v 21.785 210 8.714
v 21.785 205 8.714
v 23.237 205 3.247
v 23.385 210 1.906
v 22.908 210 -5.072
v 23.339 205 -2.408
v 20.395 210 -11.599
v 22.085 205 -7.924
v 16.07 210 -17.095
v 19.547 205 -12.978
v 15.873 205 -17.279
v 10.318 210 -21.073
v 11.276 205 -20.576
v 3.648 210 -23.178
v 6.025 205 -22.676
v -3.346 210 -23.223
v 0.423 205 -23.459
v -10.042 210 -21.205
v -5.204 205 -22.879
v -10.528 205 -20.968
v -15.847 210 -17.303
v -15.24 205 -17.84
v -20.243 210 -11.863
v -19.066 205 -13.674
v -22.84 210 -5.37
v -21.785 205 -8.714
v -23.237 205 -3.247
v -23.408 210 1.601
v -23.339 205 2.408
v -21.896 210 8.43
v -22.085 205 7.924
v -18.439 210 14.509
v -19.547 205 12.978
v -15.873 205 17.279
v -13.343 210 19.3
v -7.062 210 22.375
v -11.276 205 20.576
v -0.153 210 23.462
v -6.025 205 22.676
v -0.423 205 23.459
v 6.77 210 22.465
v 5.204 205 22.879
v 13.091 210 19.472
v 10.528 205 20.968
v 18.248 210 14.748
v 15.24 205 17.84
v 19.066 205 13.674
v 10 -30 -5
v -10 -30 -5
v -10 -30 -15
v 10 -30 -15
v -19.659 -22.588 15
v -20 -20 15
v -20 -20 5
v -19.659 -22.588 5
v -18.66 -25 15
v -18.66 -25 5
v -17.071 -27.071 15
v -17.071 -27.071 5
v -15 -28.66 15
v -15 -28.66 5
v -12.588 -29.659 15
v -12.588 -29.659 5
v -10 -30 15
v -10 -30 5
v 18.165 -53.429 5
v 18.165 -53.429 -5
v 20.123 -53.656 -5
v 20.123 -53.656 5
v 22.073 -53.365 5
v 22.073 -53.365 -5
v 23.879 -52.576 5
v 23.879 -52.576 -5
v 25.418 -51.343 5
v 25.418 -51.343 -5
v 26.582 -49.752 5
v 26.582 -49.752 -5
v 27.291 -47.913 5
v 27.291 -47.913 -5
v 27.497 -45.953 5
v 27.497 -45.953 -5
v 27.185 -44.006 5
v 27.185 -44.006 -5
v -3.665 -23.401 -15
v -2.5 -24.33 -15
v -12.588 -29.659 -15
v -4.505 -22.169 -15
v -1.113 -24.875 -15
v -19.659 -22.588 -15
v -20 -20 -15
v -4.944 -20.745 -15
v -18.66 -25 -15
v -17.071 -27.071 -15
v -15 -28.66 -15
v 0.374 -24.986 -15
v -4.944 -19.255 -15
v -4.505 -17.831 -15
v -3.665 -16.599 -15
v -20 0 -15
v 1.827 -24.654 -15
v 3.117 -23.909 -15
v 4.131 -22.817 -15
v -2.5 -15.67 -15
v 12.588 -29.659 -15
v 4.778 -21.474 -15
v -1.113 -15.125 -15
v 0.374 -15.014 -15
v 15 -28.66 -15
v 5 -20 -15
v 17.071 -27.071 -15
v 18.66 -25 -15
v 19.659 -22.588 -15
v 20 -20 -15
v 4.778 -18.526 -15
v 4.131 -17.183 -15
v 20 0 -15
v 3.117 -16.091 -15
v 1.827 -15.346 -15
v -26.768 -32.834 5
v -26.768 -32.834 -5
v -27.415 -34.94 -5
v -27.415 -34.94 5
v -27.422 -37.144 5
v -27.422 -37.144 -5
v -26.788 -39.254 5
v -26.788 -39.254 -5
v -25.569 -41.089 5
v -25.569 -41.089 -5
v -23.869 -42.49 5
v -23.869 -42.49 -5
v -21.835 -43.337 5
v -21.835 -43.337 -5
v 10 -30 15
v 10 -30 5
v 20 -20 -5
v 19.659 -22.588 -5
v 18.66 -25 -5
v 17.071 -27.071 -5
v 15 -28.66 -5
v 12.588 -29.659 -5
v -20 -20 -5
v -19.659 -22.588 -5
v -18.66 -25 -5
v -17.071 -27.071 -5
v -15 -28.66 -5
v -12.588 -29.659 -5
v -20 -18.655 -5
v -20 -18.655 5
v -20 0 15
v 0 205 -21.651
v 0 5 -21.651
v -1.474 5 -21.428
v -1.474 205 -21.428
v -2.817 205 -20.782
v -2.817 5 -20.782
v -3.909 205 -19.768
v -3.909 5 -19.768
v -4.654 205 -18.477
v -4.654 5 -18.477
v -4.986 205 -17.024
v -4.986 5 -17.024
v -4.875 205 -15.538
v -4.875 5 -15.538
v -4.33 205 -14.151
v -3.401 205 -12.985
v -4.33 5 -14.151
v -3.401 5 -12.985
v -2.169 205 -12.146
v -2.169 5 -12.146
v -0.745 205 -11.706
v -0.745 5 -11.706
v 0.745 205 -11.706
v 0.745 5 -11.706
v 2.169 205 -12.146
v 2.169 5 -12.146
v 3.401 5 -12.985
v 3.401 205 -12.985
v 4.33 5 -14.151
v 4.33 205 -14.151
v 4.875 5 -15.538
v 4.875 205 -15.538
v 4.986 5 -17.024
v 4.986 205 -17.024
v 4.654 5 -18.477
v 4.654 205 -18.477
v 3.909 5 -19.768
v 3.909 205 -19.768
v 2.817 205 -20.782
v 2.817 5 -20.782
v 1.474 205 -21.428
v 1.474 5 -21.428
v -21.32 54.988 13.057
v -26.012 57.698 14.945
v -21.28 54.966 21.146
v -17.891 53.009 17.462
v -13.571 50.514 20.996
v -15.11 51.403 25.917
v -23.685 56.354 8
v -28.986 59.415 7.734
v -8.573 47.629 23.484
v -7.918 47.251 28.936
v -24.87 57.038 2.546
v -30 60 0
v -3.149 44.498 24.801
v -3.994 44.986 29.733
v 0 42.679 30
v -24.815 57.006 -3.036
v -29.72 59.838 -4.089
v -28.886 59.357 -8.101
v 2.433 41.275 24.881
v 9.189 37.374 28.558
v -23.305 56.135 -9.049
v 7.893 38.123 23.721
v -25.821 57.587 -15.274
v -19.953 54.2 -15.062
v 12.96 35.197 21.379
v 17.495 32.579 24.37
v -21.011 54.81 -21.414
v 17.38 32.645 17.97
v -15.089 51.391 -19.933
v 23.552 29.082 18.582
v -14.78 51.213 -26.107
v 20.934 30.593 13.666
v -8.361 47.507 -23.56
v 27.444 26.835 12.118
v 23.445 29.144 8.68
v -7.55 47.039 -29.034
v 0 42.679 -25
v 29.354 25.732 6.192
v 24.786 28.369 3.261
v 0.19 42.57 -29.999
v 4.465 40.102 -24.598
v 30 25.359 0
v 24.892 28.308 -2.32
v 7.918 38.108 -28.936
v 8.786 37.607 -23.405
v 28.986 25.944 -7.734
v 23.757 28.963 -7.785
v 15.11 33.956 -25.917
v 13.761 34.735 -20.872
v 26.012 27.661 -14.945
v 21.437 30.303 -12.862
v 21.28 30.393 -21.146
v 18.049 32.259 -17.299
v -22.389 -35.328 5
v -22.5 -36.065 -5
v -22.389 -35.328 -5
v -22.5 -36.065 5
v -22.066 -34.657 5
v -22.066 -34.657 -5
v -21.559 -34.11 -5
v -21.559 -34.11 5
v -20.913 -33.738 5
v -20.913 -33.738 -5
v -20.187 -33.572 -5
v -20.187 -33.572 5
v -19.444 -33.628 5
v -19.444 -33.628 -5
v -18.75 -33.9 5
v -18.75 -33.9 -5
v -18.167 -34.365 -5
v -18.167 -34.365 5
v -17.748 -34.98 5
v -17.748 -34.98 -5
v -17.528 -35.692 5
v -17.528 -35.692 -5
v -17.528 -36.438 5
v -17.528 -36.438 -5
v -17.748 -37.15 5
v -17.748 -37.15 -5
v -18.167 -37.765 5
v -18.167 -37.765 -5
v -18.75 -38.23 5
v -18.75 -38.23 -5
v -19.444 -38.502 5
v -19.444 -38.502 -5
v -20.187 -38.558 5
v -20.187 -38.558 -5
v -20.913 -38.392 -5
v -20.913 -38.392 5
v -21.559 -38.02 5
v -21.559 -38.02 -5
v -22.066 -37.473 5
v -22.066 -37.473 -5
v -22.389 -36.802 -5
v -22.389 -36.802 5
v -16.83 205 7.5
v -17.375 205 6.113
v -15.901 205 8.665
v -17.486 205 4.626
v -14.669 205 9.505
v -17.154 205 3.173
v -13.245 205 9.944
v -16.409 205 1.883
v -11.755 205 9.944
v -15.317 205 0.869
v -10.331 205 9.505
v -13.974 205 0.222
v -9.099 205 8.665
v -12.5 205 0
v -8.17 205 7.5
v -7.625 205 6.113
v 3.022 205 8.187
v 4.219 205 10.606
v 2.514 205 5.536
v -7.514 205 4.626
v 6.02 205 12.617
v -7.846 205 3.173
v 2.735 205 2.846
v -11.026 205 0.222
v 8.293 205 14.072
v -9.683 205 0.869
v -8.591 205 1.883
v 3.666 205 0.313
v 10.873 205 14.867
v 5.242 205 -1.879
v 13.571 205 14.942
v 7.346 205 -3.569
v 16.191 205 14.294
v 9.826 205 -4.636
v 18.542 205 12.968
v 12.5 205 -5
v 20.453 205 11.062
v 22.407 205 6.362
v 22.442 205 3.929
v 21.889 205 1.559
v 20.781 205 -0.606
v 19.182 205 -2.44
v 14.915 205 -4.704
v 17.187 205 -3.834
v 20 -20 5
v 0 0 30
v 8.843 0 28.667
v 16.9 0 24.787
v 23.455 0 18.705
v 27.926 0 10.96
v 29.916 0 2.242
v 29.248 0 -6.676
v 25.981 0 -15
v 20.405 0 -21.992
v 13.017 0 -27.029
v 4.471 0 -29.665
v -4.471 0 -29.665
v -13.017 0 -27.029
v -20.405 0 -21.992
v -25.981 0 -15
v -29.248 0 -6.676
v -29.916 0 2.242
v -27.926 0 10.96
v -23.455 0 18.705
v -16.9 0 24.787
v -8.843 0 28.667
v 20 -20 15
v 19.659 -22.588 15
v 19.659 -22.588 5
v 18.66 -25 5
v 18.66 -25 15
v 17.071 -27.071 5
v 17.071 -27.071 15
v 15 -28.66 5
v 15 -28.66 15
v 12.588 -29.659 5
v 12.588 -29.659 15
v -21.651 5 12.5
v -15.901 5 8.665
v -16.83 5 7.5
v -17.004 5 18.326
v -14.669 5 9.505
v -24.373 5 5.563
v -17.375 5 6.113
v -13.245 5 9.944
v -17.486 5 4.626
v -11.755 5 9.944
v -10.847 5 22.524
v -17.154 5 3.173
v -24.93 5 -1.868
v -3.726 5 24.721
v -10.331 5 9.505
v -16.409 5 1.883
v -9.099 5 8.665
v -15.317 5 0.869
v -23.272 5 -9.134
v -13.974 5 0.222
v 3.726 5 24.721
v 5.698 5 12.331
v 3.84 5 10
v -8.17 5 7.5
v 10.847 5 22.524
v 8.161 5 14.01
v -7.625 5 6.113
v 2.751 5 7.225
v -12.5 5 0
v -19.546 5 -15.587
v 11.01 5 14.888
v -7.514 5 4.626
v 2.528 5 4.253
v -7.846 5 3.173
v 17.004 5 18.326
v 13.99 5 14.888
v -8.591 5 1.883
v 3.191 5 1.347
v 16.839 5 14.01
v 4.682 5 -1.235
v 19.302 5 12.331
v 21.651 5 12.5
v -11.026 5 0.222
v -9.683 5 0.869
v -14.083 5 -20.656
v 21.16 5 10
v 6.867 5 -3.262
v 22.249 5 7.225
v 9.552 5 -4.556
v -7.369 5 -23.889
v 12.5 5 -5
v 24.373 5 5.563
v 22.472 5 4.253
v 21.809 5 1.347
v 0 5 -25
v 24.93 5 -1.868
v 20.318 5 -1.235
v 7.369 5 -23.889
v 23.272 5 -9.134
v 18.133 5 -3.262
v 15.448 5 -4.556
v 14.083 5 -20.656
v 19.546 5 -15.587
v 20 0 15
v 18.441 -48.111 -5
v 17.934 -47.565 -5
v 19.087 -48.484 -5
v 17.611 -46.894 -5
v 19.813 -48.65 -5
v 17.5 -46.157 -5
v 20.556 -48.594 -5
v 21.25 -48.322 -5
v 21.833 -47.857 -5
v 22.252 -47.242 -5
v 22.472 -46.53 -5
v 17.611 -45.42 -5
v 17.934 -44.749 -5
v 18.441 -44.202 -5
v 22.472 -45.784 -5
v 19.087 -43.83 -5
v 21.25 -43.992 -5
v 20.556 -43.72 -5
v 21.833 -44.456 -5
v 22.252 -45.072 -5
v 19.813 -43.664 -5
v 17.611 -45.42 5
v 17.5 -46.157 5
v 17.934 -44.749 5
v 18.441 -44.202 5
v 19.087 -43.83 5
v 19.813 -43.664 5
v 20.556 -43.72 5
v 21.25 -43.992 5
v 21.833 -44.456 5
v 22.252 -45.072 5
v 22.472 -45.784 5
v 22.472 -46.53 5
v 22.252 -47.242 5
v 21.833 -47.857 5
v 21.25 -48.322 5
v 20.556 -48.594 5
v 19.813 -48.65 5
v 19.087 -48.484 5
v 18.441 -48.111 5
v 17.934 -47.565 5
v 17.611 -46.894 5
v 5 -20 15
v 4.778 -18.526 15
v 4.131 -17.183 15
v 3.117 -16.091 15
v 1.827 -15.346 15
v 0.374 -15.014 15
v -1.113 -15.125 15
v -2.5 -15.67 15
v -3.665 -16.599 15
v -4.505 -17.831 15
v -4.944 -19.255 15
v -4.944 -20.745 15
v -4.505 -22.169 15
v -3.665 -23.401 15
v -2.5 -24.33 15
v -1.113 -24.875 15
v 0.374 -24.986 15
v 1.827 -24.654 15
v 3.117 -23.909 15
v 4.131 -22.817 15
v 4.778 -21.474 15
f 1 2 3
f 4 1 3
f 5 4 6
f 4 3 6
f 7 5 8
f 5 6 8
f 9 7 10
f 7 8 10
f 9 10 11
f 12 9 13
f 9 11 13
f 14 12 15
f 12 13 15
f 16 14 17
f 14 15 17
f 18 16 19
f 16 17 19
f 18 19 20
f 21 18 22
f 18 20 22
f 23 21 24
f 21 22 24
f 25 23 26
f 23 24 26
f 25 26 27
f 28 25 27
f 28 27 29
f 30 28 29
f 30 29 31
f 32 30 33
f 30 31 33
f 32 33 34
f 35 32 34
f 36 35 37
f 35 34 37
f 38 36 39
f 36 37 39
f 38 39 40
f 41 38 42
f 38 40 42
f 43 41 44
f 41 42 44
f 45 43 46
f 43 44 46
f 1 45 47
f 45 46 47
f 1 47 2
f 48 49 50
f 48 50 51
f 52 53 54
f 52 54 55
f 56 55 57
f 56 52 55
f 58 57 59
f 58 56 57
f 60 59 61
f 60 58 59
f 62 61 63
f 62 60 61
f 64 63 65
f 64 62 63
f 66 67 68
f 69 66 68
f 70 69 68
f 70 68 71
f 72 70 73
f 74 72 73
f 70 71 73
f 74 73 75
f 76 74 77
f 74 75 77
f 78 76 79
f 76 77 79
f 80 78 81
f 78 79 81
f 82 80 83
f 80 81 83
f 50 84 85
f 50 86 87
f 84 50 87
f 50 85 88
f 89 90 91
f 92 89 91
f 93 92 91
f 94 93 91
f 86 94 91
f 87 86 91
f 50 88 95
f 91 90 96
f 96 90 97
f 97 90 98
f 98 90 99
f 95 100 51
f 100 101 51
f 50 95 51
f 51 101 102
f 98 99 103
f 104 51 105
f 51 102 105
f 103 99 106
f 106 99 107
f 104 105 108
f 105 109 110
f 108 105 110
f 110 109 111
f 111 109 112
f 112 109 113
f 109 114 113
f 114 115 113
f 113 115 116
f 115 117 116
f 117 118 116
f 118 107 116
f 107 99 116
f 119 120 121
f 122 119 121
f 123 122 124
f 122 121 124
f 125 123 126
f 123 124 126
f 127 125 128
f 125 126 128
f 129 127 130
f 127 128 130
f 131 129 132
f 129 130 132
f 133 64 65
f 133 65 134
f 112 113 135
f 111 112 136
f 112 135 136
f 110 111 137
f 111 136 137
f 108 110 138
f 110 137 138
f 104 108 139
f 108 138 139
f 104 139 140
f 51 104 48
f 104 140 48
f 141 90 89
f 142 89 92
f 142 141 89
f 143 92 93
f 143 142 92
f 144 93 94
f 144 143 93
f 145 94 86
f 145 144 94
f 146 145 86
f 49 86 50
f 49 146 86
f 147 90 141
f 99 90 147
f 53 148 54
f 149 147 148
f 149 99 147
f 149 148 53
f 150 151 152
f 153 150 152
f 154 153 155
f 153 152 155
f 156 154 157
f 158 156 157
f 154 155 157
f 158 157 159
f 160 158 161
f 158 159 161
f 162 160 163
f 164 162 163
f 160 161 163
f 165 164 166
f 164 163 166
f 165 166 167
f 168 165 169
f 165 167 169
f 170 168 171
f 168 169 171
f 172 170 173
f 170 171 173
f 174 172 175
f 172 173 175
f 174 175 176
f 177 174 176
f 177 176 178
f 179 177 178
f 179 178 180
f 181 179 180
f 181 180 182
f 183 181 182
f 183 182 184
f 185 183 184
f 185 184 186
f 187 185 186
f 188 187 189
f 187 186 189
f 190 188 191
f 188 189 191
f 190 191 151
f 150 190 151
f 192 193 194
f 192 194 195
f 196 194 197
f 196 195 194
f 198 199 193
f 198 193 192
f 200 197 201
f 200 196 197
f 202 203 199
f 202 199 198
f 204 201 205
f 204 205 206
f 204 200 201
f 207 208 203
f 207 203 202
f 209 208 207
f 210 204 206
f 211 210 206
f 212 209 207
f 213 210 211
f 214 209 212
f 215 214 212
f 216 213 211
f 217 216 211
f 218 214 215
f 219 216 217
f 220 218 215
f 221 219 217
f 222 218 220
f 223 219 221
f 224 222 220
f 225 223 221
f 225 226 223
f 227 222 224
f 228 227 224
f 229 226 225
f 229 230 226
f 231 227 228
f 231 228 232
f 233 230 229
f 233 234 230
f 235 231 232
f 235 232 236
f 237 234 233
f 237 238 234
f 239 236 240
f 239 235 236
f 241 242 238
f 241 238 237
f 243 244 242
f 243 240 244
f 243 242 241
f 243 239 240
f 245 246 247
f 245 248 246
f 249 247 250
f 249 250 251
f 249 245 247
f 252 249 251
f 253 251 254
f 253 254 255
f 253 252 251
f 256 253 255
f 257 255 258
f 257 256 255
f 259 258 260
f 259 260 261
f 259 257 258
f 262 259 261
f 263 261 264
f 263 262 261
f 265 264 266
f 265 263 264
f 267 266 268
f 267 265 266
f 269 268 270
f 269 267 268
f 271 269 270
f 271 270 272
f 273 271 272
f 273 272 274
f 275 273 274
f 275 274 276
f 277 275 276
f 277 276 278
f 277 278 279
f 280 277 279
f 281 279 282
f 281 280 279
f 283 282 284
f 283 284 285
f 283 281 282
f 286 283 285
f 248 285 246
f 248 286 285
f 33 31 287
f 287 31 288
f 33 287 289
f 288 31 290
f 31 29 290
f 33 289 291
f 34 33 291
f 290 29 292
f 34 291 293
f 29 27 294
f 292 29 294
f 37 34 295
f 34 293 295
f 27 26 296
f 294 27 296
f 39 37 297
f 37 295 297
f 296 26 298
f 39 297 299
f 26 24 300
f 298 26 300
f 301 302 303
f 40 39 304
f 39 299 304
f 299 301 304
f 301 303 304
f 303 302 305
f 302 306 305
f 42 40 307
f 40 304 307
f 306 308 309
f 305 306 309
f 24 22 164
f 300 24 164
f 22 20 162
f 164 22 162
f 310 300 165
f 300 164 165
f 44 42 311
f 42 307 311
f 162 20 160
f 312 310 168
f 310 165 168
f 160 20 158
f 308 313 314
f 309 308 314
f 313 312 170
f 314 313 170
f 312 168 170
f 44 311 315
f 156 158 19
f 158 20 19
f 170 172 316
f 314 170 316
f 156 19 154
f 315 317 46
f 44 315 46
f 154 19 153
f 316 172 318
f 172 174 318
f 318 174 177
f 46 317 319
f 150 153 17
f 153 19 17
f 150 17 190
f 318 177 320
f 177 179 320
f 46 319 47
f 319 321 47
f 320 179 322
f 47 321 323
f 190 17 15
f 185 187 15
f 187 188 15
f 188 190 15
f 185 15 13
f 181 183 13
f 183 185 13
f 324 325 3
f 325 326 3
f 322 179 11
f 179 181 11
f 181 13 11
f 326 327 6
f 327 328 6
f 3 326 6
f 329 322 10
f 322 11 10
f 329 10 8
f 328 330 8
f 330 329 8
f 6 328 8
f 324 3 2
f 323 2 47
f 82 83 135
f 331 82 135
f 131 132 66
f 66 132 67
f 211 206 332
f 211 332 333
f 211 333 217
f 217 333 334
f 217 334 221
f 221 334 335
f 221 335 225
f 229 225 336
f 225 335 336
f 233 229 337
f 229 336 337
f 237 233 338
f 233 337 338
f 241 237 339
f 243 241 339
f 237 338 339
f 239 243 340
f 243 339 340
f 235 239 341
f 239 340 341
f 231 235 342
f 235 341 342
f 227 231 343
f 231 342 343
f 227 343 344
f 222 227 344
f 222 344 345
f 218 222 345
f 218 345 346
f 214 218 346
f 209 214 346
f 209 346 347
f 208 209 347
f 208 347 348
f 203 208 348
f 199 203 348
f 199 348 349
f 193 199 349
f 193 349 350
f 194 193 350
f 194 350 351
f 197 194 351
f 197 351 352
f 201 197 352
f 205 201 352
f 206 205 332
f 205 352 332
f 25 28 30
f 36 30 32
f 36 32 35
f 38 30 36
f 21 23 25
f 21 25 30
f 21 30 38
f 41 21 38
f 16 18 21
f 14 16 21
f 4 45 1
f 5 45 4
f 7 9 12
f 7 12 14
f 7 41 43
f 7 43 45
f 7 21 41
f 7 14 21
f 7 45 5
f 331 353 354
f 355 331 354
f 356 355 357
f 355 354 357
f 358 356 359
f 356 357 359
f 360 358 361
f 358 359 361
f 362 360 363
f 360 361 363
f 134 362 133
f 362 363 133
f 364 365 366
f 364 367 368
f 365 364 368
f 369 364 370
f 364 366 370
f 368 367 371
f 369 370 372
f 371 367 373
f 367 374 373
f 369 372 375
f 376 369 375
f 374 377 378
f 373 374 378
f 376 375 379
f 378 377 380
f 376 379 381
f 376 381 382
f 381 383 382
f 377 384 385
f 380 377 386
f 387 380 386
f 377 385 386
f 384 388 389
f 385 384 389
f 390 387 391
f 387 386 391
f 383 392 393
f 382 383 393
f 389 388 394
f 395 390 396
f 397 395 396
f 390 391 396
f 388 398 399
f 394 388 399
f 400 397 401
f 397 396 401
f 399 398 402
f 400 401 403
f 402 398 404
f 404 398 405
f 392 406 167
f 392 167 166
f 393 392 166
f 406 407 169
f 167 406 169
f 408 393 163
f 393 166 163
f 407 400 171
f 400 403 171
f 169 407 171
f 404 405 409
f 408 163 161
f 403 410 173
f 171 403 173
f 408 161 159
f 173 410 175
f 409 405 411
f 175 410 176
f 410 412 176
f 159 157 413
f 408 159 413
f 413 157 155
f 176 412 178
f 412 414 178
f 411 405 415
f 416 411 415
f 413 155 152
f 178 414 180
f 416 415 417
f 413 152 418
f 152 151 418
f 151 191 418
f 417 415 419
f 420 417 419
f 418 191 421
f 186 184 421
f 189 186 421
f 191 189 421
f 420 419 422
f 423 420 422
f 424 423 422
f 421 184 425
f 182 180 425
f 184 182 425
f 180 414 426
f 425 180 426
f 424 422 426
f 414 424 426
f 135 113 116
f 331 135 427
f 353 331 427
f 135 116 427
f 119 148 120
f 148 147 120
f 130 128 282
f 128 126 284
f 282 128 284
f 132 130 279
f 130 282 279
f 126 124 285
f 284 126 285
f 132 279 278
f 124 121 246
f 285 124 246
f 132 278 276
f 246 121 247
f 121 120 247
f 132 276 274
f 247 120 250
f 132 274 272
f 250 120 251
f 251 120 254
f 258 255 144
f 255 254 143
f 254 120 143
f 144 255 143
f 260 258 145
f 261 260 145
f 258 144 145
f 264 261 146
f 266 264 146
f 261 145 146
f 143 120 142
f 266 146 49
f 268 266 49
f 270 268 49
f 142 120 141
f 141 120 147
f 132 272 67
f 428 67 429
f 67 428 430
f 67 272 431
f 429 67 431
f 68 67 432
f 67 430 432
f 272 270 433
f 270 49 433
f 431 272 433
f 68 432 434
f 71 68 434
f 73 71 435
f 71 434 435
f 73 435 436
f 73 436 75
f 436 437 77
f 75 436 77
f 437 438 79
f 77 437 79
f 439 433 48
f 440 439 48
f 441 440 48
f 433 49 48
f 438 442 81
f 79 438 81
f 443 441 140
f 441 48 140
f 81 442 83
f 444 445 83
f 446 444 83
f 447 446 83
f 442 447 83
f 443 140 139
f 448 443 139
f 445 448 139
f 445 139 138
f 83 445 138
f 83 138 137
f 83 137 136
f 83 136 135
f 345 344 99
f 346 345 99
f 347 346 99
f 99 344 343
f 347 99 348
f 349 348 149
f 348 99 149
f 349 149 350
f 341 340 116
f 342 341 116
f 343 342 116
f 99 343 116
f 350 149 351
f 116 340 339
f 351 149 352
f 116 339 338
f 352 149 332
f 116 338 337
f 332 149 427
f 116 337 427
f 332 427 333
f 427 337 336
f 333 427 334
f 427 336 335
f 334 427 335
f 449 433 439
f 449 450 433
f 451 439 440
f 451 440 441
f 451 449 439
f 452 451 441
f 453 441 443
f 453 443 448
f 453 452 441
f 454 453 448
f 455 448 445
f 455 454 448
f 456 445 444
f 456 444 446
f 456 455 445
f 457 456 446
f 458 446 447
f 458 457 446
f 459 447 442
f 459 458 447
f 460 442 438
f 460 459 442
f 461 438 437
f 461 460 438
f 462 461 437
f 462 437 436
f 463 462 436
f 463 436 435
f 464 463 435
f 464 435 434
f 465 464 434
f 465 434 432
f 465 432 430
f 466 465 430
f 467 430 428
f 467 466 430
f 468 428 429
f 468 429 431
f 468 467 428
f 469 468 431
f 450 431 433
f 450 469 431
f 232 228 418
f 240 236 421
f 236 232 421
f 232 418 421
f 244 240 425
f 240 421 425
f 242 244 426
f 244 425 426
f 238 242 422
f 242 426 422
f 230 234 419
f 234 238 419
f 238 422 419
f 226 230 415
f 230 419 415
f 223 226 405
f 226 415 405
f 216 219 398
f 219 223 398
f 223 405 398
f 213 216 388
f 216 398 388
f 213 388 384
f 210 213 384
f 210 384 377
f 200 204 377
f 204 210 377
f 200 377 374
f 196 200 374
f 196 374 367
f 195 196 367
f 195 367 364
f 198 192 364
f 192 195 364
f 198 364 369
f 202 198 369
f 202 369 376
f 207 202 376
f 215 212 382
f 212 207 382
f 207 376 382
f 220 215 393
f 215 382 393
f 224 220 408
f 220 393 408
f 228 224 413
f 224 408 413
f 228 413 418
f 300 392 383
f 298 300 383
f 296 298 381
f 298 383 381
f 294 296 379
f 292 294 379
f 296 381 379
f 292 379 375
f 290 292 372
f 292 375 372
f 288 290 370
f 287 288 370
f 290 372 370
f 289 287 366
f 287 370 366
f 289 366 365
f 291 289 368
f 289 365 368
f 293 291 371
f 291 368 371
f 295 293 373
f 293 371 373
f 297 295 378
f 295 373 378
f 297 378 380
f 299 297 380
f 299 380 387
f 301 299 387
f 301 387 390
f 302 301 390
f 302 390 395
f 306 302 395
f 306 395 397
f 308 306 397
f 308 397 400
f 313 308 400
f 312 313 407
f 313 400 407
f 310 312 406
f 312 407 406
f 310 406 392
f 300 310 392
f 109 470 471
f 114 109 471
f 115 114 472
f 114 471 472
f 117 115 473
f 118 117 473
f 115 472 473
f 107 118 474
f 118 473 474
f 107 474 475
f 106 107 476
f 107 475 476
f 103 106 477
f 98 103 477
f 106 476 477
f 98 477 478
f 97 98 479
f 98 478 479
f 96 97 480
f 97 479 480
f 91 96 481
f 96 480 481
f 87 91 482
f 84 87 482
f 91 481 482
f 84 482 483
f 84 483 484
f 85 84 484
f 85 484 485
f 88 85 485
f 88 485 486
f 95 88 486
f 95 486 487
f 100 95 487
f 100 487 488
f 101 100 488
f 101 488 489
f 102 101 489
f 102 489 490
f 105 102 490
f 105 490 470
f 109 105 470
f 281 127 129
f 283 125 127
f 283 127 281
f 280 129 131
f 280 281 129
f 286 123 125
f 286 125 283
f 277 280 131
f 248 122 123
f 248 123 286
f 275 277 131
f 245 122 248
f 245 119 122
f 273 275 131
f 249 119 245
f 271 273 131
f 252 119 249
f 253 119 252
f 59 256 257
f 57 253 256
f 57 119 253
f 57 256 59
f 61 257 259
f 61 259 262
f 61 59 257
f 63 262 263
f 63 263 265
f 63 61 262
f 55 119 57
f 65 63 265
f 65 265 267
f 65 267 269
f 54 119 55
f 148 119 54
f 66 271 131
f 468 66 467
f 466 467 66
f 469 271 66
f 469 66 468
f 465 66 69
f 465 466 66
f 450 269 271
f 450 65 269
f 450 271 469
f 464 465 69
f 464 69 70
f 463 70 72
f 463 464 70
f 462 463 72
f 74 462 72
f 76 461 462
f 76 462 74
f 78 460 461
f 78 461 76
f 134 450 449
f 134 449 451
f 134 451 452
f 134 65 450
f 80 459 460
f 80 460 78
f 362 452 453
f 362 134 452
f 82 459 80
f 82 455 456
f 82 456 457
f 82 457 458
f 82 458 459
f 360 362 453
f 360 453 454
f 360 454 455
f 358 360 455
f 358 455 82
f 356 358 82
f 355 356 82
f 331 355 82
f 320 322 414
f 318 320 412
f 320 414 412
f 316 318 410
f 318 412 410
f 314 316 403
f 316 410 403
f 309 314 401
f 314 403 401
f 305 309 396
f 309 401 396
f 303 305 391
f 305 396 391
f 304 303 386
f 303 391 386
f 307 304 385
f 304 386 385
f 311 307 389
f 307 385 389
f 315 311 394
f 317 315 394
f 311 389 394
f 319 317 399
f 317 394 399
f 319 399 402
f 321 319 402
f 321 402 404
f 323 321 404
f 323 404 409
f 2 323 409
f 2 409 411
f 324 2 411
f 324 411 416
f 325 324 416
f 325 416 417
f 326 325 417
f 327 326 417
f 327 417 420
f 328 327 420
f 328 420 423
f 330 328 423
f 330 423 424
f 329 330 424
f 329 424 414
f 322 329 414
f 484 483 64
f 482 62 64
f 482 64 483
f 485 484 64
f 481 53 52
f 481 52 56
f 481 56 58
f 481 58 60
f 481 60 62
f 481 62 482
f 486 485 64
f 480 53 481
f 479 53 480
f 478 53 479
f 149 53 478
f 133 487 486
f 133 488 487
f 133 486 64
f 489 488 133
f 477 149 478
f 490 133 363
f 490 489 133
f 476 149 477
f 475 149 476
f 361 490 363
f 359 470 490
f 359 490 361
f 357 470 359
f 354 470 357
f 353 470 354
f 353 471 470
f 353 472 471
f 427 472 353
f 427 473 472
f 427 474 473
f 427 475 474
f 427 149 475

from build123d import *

# Parameters (mm, degrees)
CROQUIS2_R                 = 30
SALIENTE_EXTRUIR1_DEPTH    = 60
CROQUIS3_W                 = 40
CROQUIS3_H                 = 30
SALIENTE_EXTRUIR2_DEPTH    = 30
REDONDEO1_R                = 10
CROQUIS4_R                 = 5
CORTAR_EXTRUIR1_DEPTH      = 81.777472107
CORTAR_EXTRUIR2_DEPTH      = 74.484692283
CORTAR_EXTRUIR2_DEPTH_BACK = 74.484692283
CROQUIS7_R                 = 25
CORTAR_EXTRUIR3_DEPTH      = 70.462219947
CROQUIS8_R                 = 5
CROQUIS8_R_2               = 10
SALIENTE_EXTRUIR3_DEPTH    = 200
CROQUIS10_R                = 23.462912018
SALIENTE_EXTRUIR4_DEPTH    = 5
CROQUIS11_R                = 2.5
SALIENTE_EXTRUIR5_DEPTH    = 5


with BuildPart() as part:
    # Croquis2 → Saliente-Extruir1 (new body)
    with BuildSketch(Plane(origin=(0, 0, 0), x_dir=(1, 0, 0), z_dir=(0, 1, 0))):
        with Locations(Location((0, 0, 0), (0, 0, 270))):
            Circle(CROQUIS2_R)
    extrude(amount=SALIENTE_EXTRUIR1_DEPTH)

    # Croquis3 → Saliente-Extruir2 (add)
    with BuildSketch(Plane.XZ):
        Rectangle(CROQUIS3_W, CROQUIS3_H)
    extrude(amount=SALIENTE_EXTRUIR2_DEPTH)

    # Redondeo1
    redondeo1_edges = [part.edges().sort_by_distance(p)[0] for p in [
        (-20, -30, 0),
        (20, -30, 0),
    ]]
    fillet(redondeo1_edges, radius=REDONDEO1_R)

    # Croquis4 → Cortar-Extruir1 (cut, through all)
    with BuildSketch(Plane.XY.offset(15)):
        with Locations((0, -20)):
            Circle(CROQUIS4_R)
    extrude(amount=-CORTAR_EXTRUIR1_DEPTH, mode=Mode.SUBTRACT)

    # Croquis5 → Cortar-Extruir2 (cut, two sides: drawn at the far end of the back side and taken through both)
    with BuildSketch(Plane.XY.offset(-CORTAR_EXTRUIR2_DEPTH_BACK)):
        Polygon((30, 60), (-30, 60), (30, 25.358983849), align=None)
    extrude(amount=CORTAR_EXTRUIR2_DEPTH + CORTAR_EXTRUIR2_DEPTH_BACK, mode=Mode.SUBTRACT)

    # Croquis7 → Cortar-Extruir3 (cut, through all)
    with BuildSketch(Plane(origin=(0, 5, 0), x_dir=(-1, 0, 0), z_dir=(0, -1, 0))):
        with Locations(Location((0, 0, 0), (0, 0, 90))):
            Circle(CROQUIS7_R)
    extrude(amount=-CORTAR_EXTRUIR3_DEPTH, mode=Mode.SUBTRACT)

    # Croquis8 → Saliente-Extruir3 (add)
    with BuildSketch(Plane(origin=(0, 5, 0), x_dir=(1, 0, 0), z_dir=(0, 1, 0))):
        with Locations(Location((0, 16.650635095, 0), (0, 0, 90))):
            Circle(CROQUIS8_R)
        with Locations(Location((12.5, -5, 0), (0, 0, 90))):
            Circle(CROQUIS8_R_2)
        with Locations(Location((-12.5, -5, 0), (0, 0, 90))):
            Circle(CROQUIS8_R)
    extrude(amount=SALIENTE_EXTRUIR3_DEPTH)

    # Croquis10 → Saliente-Extruir4 (add)
    with BuildSketch(Plane(origin=(0, 205, 0), x_dir=(1, 0, 0), z_dir=(0, 1, 0))):
        with Locations(Location((0, 0, 0), (0, 0, 338.198590514))):
            Circle(CROQUIS10_R)
    extrude(amount=SALIENTE_EXTRUIR4_DEPTH)

    # Croquis11 → Saliente-Extruir5 (add, symmetric)
    with BuildSketch(Plane(origin=(0, 0, 0), x_dir=(-1, 0, 0), z_dir=(0, 0, -1))):
        with BuildLine():
            Line((-27.185083119, -44.006420995), (-20, -20))
            Line((-20, -20), (0.452470226, -27.989728354))
            Line((0.452470226, -27.989728354), (20, -18.654592883))
            Line((20, -18.654592883), (26.768433701, -32.834107425))
            ThreePointArc((26.768433701, -32.834107425), (26.788350186, -39.25372151), (21.834748215, -43.337061956))
            Line((21.834748215, -43.337061956), (-18.165251785, -53.42902271))
            ThreePointArc((-18.165251785, -53.42902271), (-25.417829516, -51.343148457), (-27.185083119, -44.006420995))
        make_face()
        with Locations((-20, -46.156904794)):
            Circle(CROQUIS11_R, mode=Mode.SUBTRACT)
        with Locations((20, -36.06494404)):
            Circle(CROQUIS11_R, mode=Mode.SUBTRACT)
    extrude(amount=SALIENTE_EXTRUIR5_DEPTH, both=True)


solid = part.part
